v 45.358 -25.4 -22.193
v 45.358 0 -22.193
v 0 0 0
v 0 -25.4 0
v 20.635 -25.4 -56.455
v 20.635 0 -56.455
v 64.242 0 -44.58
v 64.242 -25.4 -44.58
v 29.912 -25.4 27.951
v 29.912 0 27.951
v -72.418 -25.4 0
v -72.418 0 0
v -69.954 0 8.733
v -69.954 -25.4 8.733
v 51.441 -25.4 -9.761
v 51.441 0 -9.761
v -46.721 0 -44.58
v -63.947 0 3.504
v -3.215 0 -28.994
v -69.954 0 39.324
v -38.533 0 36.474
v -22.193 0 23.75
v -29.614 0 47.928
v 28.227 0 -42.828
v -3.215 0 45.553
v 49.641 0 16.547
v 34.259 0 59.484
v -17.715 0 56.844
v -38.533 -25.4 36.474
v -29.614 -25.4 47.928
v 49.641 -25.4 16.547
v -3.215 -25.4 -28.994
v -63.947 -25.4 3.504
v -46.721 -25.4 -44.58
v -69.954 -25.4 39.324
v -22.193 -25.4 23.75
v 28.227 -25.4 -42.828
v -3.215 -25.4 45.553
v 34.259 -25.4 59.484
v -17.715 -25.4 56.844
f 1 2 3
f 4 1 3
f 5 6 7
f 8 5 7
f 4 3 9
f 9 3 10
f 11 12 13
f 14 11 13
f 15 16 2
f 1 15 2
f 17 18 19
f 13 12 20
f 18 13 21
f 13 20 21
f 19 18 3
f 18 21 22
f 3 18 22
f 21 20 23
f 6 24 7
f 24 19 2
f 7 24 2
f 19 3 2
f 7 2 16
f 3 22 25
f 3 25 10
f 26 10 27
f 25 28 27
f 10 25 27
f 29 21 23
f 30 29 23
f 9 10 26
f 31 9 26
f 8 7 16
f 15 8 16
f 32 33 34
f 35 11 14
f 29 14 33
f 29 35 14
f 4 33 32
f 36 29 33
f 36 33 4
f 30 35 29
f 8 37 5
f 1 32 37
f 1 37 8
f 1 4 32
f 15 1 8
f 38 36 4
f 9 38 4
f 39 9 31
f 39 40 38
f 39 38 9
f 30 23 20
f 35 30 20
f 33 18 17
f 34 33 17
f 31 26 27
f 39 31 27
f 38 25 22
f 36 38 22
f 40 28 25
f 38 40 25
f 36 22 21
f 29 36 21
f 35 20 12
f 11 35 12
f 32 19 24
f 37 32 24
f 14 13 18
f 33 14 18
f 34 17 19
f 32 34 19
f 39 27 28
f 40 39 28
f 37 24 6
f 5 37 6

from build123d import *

# Parameters (mm, degrees)
F1_DEPTH = 25.4


with BuildPart() as f1:
    # F0 (on Front) → F1 (new body)
    with BuildSketch(Plane.XZ):
        Polygon((-22.192558, 23.749927), (0, 0), (29.912299, 27.950841), (49.64124, 16.54708), (34.25918, 59.484117), (-17.715111, 56.844085), (-3.21496, 45.55314), align=None)
        Polygon((-51.003944, -8.176205), (-22.192558, 23.749927), (-38.5332, 36.474021), (-29.61387, 47.928478), (-69.954226, 39.32365), (-72.417811, 0), (-69.954226, 8.732829), (-63.947109, 3.504212), align=None)
        Polygon((-24.917955, -24.528613), (0, 0), (-22.192558, 23.749927), (-51.003944, -8.176205), (-63.947109, 3.504212), (-46.721168, -44.579782), (-3.21496, -28.993818), align=None)
        Polygon((45.358468, -22.192556), (0, 0), (-24.917955, -24.528613), (-3.21496, -28.993818), (28.227372, -42.827737), (20.635184, -56.454744), (64.241603, -44.579782), (51.440848, -9.761026), align=None)
    extrude(amount=F1_DEPTH)


solid = f1.part
